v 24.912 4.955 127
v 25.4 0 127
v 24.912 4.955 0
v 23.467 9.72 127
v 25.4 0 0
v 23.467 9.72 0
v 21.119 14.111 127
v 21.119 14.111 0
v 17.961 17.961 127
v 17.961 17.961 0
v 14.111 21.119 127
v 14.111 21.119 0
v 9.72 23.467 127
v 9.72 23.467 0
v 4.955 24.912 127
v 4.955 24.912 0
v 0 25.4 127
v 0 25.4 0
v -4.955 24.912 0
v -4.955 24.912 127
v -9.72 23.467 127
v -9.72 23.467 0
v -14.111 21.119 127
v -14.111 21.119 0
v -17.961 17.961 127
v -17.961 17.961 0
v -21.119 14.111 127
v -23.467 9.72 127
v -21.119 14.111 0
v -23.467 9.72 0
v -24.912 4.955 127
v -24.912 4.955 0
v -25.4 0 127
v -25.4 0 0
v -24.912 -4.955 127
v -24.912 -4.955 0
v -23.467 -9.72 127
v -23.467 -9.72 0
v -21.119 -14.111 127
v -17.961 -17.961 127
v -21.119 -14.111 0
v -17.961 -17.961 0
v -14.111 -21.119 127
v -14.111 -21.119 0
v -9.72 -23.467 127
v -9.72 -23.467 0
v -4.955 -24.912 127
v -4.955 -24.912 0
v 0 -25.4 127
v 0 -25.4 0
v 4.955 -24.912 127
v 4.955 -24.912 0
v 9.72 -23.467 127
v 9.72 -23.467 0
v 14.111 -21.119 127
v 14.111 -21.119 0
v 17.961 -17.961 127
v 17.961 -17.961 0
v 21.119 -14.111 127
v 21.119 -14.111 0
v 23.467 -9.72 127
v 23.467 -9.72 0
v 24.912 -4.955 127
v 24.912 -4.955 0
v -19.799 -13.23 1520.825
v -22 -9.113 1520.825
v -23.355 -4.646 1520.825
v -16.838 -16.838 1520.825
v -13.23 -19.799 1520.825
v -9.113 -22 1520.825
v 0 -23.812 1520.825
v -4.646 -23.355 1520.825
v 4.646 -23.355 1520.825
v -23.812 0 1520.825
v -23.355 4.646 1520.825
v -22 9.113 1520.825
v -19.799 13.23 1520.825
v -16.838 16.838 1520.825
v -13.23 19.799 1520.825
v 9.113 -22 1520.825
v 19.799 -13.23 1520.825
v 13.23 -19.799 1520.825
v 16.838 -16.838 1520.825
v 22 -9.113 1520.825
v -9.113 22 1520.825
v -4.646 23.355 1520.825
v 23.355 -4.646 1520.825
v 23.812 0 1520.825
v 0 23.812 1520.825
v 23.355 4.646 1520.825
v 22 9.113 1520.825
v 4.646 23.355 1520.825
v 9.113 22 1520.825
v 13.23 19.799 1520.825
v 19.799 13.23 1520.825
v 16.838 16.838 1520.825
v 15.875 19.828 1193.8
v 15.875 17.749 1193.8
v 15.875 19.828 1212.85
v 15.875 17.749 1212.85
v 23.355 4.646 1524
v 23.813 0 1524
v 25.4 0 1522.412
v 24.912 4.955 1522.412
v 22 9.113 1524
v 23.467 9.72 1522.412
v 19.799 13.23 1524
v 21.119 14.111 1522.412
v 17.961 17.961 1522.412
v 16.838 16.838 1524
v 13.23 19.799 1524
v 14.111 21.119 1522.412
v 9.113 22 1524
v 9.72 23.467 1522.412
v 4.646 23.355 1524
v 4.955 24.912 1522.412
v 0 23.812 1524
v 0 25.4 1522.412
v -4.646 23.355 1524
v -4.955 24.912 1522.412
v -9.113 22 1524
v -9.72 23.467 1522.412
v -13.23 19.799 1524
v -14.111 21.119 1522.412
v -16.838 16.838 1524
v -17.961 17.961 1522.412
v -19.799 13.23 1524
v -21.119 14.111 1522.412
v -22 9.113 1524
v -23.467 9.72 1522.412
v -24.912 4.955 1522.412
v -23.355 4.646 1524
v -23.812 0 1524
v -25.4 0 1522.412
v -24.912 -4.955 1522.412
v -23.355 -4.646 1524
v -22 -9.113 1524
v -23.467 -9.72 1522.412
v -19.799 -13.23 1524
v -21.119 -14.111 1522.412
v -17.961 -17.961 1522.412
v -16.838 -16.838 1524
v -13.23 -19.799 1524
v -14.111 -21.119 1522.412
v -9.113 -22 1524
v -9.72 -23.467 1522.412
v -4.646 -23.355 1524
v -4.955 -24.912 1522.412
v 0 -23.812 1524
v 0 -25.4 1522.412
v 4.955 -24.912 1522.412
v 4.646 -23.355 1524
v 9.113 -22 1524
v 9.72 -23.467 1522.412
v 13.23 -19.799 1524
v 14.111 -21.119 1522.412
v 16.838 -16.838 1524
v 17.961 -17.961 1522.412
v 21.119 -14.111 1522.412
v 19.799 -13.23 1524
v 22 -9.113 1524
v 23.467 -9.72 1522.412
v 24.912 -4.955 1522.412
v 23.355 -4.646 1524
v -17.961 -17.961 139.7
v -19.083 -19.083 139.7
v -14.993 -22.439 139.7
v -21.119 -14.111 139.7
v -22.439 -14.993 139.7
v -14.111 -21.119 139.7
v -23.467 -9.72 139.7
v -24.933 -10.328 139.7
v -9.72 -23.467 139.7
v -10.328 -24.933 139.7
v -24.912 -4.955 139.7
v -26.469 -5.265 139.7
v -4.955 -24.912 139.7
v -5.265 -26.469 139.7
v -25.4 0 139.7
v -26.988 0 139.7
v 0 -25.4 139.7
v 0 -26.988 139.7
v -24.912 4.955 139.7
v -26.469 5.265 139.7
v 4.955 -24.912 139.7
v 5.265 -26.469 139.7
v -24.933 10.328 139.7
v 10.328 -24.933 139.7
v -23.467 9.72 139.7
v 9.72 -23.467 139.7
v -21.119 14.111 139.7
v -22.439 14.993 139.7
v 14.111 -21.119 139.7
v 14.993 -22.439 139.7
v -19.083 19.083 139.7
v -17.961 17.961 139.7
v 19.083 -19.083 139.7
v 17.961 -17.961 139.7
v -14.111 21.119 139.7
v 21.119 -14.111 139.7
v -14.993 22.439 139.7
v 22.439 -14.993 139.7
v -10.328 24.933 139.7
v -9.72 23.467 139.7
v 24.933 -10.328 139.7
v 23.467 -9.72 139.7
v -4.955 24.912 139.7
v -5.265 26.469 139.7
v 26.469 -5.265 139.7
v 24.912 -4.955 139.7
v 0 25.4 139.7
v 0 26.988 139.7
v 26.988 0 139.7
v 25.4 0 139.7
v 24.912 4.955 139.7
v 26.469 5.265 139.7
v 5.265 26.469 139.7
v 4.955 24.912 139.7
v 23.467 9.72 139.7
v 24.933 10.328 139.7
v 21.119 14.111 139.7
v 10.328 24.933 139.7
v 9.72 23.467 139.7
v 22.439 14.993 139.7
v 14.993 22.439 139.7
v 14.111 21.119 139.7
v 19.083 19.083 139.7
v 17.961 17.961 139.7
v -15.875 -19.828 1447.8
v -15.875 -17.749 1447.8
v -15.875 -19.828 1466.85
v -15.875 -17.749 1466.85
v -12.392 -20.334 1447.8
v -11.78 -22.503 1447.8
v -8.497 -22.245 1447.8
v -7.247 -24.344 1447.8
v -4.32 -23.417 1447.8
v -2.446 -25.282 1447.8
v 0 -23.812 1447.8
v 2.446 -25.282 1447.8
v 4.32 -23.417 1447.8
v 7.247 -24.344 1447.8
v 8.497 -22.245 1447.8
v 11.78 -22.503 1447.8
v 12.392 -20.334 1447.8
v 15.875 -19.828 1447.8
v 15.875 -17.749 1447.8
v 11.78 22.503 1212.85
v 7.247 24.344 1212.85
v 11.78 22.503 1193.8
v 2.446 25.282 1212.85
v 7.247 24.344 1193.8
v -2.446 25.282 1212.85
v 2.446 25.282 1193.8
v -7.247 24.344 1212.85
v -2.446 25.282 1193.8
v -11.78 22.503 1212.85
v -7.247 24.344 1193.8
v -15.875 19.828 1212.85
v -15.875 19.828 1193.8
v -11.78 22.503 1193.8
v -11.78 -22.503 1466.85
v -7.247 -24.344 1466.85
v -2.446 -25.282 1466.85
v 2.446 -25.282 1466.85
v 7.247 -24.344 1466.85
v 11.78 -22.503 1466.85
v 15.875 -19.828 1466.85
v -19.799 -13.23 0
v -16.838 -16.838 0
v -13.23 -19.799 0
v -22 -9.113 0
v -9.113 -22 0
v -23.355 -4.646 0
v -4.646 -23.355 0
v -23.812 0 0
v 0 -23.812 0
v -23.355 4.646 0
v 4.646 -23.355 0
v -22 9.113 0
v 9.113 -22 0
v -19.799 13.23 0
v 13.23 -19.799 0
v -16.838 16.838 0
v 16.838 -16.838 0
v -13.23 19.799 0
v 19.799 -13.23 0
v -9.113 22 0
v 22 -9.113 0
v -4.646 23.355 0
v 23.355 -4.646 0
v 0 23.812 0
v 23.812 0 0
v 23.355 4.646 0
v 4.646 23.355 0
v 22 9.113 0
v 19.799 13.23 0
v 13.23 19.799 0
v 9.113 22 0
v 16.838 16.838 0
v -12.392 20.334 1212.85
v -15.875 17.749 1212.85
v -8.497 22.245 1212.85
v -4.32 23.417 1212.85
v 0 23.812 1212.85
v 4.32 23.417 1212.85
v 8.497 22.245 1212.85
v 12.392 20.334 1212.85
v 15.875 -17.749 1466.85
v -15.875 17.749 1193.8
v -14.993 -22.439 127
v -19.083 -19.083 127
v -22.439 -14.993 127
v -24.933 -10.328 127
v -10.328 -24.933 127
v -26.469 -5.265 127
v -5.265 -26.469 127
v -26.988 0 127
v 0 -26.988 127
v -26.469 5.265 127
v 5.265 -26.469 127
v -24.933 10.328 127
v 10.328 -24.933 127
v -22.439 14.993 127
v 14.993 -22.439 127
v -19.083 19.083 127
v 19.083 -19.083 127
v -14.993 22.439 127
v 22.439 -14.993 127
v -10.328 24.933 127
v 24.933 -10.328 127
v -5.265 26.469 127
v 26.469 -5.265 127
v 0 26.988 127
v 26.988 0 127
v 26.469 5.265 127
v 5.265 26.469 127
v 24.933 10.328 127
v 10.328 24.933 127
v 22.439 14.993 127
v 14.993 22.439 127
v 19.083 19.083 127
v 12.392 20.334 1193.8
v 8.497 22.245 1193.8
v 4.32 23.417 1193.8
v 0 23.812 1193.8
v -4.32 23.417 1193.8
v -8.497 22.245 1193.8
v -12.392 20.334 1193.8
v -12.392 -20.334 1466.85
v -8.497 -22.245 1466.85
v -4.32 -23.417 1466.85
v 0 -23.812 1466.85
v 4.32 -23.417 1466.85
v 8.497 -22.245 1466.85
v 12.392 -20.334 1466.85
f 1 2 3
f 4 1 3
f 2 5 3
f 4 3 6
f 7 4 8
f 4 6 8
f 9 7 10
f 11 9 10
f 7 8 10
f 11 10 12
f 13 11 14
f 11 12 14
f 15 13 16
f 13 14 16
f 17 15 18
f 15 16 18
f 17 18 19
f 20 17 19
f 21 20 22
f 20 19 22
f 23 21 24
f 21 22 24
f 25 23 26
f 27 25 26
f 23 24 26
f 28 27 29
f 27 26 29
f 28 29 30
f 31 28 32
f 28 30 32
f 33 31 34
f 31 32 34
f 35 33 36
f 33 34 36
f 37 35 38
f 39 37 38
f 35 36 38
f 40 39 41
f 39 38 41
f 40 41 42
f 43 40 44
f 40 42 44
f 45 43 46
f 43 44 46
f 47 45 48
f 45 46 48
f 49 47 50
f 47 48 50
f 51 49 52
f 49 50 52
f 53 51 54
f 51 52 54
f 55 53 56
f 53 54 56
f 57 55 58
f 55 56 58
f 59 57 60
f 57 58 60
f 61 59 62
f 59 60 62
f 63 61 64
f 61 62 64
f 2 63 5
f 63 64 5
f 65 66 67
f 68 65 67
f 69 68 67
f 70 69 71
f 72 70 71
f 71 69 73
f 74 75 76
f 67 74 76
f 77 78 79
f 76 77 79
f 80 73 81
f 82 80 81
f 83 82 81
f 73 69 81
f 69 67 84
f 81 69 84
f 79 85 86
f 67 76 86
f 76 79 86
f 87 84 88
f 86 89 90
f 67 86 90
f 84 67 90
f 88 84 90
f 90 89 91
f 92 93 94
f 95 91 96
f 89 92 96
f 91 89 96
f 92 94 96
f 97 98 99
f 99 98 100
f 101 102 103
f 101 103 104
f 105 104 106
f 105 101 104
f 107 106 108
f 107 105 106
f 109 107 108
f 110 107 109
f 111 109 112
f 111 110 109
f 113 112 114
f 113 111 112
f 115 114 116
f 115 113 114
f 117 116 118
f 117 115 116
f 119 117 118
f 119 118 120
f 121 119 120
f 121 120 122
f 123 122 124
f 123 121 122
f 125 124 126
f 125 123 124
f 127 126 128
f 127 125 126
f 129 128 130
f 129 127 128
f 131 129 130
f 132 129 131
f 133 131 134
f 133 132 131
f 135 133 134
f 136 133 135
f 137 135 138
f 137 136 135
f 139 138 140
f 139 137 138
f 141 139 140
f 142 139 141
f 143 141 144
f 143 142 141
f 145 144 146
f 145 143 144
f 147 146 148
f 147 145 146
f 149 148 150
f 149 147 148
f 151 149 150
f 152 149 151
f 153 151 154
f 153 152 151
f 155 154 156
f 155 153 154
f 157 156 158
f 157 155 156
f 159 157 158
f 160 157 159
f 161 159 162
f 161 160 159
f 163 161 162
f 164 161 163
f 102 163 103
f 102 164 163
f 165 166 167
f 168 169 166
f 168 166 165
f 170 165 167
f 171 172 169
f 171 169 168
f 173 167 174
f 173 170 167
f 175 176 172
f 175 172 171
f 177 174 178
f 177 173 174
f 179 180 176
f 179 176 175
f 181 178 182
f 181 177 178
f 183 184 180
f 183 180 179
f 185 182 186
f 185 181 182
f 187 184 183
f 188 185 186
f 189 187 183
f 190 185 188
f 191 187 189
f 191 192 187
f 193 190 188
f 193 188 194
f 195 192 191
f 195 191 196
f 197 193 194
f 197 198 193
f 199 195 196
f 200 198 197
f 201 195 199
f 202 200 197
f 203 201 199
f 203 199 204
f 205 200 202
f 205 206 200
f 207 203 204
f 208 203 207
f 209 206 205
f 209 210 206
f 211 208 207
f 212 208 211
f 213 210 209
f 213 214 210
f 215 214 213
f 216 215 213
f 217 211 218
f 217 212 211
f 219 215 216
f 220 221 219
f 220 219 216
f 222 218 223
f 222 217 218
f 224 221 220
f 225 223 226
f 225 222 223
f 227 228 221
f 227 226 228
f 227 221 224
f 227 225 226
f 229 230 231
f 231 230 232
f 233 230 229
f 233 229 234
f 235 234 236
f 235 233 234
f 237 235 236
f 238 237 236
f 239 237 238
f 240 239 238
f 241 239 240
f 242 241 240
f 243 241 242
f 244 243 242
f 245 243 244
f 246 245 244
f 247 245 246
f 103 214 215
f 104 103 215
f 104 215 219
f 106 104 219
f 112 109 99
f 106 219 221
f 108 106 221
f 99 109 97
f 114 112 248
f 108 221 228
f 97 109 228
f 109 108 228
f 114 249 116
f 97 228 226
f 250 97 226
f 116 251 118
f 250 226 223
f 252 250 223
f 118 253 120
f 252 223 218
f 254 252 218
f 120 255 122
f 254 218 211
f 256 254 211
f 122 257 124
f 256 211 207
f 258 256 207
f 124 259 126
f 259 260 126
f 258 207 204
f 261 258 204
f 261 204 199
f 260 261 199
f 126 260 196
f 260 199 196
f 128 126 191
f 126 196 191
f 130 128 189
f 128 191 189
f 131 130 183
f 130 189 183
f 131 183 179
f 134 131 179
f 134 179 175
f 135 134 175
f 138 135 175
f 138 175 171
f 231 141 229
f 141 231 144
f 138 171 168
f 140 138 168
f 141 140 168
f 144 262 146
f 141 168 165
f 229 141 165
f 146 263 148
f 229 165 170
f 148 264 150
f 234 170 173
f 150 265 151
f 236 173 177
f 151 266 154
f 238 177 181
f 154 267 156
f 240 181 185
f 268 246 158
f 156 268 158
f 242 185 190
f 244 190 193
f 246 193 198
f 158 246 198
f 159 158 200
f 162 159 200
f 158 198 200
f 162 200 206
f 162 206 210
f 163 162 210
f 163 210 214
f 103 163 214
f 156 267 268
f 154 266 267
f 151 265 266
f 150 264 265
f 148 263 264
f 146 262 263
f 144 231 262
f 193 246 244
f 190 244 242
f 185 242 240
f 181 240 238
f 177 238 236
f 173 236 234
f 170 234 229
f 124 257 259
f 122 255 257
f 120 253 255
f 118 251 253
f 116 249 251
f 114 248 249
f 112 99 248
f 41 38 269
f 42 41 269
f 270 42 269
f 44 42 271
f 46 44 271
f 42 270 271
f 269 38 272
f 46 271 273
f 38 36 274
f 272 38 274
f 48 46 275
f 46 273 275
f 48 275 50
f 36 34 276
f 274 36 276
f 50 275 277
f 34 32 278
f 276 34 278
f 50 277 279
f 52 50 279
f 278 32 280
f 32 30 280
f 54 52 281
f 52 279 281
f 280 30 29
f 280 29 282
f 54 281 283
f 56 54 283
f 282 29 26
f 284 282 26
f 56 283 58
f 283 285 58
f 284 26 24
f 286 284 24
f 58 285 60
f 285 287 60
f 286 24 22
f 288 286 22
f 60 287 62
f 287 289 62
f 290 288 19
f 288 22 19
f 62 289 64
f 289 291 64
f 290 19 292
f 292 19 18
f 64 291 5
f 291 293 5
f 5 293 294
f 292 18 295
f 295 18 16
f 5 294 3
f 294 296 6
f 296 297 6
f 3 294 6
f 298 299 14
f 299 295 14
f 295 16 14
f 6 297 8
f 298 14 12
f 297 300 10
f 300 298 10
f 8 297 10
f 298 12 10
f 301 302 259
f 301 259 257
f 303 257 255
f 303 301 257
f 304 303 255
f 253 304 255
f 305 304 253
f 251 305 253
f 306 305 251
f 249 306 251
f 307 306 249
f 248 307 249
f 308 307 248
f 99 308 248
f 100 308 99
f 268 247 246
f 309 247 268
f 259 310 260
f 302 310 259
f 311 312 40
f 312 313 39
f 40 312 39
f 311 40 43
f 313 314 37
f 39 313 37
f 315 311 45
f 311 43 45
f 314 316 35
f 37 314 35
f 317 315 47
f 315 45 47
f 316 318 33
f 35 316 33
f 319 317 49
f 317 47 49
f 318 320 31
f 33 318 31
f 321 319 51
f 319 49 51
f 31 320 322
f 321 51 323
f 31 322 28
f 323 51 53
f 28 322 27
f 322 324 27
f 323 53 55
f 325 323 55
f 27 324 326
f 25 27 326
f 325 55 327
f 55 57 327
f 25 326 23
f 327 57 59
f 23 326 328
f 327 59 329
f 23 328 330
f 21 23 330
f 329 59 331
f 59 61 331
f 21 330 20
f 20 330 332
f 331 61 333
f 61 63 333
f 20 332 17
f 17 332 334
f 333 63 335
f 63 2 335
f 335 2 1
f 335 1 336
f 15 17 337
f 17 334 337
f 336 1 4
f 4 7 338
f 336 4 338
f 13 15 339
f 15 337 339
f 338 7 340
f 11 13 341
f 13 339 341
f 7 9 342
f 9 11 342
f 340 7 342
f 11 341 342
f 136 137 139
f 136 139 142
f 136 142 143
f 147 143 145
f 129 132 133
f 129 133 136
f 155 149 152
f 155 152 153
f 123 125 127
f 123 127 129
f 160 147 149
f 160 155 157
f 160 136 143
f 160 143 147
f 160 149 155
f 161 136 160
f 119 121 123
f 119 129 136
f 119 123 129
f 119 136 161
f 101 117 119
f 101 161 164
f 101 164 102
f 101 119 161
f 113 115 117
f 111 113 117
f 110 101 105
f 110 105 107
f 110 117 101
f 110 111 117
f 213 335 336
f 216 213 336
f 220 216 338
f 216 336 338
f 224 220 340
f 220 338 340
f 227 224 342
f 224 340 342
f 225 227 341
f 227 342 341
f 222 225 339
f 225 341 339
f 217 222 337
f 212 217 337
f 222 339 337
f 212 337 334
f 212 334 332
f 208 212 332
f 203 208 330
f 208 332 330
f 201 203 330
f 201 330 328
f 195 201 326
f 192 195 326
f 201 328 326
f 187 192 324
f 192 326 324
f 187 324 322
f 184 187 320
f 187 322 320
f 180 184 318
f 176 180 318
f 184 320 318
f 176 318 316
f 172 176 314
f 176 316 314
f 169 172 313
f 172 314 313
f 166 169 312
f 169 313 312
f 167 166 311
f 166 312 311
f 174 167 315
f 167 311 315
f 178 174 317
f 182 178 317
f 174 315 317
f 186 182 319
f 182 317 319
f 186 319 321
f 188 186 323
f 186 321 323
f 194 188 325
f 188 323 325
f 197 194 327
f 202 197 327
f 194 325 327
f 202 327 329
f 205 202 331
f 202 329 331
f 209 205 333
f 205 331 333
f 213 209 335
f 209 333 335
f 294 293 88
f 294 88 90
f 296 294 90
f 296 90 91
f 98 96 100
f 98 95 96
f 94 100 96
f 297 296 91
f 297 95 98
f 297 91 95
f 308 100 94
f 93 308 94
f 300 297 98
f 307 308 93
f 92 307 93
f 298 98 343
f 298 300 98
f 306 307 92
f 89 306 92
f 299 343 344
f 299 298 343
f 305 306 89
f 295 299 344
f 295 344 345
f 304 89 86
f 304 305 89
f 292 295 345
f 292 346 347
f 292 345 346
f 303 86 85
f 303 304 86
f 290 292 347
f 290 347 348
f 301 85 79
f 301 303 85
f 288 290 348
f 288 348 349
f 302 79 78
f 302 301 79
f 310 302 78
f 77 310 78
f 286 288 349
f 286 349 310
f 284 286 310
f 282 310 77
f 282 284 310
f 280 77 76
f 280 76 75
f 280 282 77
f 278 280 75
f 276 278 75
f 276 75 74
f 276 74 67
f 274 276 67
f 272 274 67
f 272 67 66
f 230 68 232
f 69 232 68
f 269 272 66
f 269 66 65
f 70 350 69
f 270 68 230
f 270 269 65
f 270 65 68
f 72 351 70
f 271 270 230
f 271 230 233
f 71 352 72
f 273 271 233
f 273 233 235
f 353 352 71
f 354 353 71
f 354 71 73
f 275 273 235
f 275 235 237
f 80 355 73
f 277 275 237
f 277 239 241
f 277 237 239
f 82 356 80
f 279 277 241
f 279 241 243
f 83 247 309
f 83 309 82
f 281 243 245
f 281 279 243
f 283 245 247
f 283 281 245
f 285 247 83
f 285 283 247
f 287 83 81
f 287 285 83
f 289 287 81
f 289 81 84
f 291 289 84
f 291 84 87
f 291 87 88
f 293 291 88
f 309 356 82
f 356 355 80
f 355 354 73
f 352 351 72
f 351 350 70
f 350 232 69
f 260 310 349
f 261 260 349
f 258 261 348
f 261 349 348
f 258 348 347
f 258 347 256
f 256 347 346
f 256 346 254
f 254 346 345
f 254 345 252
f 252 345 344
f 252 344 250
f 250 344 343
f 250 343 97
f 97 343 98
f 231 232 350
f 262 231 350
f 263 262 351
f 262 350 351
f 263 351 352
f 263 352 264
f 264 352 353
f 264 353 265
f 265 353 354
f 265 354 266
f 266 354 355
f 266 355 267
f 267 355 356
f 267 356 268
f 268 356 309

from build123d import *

# Parameters (mm, degrees)
F0_R     = 25.4
F0_R_2   = 23.8125
F1_DEPTH = 1524
F2_DEPTH = 1520.825
F3_SIZE  = 1.5875
F4_W     = 31.75
F4_H     = 19.05
F5_DEPTH = 50.8
F6_START = 127
F0_R_3   = 26.9875
F6_DEPTH = 12.7
F7_DEPTH = 139.7


with BuildPart() as f1:
    # F0 (on Top) → F1 (new body)
    with BuildSketch(Plane.XY):
        Circle(F0_R)
        Circle(F0_R_2, mode=Mode.SUBTRACT)
        Circle(F0_R_2)
    extrude(amount=F1_DEPTH)

    # F0 (on Top) → F2 (cut)
    with BuildSketch(Plane.XY):
        Circle(F0_R_2)
    extrude(amount=F2_DEPTH, mode=Mode.SUBTRACT)

    # F3
    f3_edges = [f1.edges().sort_by_distance(p)[0] for p in [
        (-25.4, 0, 1524),
    ]]
    chamfer(f3_edges, length=F3_SIZE)

    # F4 (on Front) → F5 (cut)
    with BuildSketch(Plane.XZ):
        with Locations((0, 1203.325)):
            Rectangle(F4_W, F4_H)
    extrude(amount=-F5_DEPTH, mode=Mode.SUBTRACT)

    # F0 (on Top) → F6 (join)
    with BuildSketch(Plane.XY.offset(F6_START)):
        Circle(F0_R_3)
        Circle(F0_R, mode=Mode.SUBTRACT)
    extrude(amount=F6_DEPTH)

    # F4 (on Front) → F7 (cut)
    with BuildSketch(Plane.XZ):
        with Locations((0, 1457.325)):
            Rectangle(F4_W, F4_H)
    extrude(amount=F7_DEPTH, mode=Mode.SUBTRACT)


solid = f1.part
